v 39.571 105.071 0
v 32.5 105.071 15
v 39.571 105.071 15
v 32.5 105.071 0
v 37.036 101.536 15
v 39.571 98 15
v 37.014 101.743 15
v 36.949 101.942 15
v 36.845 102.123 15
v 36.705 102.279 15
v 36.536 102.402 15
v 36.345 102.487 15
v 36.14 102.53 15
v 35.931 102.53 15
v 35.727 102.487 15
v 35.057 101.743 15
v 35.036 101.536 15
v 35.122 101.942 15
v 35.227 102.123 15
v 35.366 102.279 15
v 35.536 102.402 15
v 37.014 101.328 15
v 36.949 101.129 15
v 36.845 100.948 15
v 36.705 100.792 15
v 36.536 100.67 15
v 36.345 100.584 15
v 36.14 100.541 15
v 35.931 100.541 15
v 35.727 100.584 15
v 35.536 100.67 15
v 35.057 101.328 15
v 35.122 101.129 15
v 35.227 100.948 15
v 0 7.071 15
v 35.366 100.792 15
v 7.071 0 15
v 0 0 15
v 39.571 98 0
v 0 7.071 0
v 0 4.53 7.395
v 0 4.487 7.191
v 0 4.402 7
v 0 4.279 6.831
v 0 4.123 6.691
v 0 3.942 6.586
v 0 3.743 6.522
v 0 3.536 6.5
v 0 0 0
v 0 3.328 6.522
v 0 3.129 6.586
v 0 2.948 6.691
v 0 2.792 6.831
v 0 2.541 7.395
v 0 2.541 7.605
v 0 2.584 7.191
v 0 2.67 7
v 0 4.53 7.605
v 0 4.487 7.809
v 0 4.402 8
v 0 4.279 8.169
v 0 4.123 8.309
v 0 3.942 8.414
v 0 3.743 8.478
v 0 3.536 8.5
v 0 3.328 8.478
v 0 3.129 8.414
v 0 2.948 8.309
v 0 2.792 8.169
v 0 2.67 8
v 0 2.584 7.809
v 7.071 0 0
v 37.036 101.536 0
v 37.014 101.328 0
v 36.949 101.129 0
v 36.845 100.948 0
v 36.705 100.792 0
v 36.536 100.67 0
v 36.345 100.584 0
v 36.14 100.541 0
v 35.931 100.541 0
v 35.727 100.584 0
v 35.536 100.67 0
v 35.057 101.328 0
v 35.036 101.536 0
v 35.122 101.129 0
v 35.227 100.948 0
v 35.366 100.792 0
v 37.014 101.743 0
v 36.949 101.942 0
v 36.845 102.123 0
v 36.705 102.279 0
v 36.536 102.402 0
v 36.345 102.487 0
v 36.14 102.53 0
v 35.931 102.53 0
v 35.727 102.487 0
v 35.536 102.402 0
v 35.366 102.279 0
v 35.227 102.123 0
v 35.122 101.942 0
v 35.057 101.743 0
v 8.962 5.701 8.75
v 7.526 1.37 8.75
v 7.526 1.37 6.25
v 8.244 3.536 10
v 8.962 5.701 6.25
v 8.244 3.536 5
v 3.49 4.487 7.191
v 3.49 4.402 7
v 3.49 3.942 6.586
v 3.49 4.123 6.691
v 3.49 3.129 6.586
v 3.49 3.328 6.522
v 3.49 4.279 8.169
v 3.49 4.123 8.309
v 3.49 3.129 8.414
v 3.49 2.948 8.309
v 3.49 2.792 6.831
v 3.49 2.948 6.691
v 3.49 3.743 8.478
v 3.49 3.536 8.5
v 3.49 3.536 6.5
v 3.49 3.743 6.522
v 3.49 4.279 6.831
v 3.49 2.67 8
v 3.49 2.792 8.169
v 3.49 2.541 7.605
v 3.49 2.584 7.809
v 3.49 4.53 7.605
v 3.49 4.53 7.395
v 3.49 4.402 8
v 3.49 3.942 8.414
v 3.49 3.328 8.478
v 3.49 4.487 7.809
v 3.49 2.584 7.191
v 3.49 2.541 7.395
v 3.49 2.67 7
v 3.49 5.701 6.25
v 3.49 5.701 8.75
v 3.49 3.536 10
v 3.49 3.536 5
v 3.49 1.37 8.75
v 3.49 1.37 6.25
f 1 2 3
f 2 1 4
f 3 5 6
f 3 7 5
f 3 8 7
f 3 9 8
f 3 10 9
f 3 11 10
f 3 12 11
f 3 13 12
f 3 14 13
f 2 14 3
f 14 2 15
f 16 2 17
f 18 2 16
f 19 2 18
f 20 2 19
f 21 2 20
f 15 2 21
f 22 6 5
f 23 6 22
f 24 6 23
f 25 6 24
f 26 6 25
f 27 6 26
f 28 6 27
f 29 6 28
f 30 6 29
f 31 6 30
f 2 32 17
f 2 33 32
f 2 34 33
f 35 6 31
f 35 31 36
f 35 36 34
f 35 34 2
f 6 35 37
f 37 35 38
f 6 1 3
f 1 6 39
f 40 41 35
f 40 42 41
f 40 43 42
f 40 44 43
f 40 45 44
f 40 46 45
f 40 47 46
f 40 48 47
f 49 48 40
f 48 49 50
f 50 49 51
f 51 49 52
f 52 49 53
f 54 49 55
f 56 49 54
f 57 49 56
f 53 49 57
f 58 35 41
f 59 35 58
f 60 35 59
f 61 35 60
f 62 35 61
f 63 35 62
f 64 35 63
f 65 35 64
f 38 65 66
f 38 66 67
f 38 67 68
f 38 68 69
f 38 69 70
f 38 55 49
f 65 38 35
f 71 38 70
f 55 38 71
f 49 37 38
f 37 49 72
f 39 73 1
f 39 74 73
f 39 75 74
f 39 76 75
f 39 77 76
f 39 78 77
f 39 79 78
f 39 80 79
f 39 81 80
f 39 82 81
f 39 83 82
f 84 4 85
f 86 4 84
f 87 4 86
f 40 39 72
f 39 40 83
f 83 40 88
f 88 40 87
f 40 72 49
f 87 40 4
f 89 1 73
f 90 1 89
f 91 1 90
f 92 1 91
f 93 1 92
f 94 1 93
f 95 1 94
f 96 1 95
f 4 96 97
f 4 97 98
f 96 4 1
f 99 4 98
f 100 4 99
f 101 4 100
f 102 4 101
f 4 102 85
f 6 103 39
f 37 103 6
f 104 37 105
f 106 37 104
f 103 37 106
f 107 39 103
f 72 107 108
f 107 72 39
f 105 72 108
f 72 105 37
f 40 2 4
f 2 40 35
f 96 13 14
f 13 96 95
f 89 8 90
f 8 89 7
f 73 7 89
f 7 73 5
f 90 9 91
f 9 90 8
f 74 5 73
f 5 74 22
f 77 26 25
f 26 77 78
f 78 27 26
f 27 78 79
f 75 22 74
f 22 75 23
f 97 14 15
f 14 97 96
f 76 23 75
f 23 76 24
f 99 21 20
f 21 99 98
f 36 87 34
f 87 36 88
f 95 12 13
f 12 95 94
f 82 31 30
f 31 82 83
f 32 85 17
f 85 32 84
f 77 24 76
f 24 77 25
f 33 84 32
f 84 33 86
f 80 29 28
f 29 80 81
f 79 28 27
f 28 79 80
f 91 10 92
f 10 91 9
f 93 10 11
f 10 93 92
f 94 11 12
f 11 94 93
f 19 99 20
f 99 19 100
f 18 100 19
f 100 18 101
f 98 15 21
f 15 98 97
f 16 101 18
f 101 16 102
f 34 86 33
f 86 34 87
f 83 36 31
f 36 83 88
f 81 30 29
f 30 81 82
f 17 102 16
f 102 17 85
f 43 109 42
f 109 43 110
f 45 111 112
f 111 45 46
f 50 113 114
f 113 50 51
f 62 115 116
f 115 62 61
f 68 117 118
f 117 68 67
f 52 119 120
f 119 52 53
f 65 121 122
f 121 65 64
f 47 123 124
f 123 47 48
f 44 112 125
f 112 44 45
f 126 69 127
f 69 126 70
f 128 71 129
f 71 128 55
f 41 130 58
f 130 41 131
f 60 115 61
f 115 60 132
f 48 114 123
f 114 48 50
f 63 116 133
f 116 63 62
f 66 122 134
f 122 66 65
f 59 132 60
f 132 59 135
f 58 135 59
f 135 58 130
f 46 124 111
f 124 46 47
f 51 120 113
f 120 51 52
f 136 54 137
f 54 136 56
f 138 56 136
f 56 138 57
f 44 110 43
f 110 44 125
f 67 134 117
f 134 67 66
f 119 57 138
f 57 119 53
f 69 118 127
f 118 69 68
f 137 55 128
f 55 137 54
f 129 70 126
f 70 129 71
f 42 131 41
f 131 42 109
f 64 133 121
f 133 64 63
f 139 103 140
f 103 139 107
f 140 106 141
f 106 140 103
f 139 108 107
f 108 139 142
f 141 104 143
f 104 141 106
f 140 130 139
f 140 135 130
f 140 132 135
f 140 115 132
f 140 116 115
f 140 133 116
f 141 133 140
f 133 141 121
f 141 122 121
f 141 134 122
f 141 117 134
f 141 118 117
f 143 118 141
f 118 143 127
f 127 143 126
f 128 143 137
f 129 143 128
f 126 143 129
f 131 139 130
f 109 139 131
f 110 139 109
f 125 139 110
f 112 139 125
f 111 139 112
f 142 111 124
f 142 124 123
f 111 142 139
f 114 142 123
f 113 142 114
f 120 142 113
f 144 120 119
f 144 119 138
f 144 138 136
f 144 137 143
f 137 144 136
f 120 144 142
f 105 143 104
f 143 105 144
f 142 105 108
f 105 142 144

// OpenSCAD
/*
Copyright (C) Saeed Gholami Shahbandi. All rights reserved.
Author: Saeed Gholami Shahbandi (saeed.gh.sh@gmail.com)

This file is part of Arrangement Library.
The of Arrangement Library is free software: you can redistribute it and/or
modify it under the terms of the GNU Lesser General Public License as published
by the Free Software Foundation, either version 3 of the License,
or (at your option) any later version.

This program is distributed in the hope that it will be useful, but WITHOUT ANY
WARRANTY; without even the implied warranty of MERCHANTABILITY or FITNESS FOR A
PARTICULAR PURPOSE. See the GNU Lesser General Public License for more details.

You should have received a copy of the GNU Lesser General Public License along
with this program. If not, see <http://www.gnu.org/licenses/>
*/
tol = 0.02;

/*
      __
     /  |
B   /   |
   /   /
  |   /
C |__/
   C   A
*/

/// 863:  long edge of the inside of the wooden frame
/// 120: short edge of the inside of the wooden frame
/// 667: long edge of the plexiglass
/// 55: short edge of the plexiglass
/// height is the space between two plexiglass

height = 15;
A = (120 - 55) / 2;
B = (863 - 667) / 2;

thickness = 10; // desired_thickness of the profile
C = sqrt(thickness * thickness / 2);
screw_diameter=2;
nut_diameter=5;
points = [
     [0, 0], // 1
     [C, 0], // 2
     [A+C, B], // 3
     [A+C, B+C], // 4
     [A, B+C], // 5
     [0, C], // 6
     ];

{
     difference(){
          // extrude the cross-section of the profile
          color("Green", 1.0)
          linear_extrude(height = height)
          polygon(points);

          // remove screw that goes through plexiglass
          color("Red", 1.0)
          translate([A+C/2, B+C/2, height/2 + tol])
          cylinder(h=height+3*tol, d=screw_diameter, $fn= 30, center=true);

          // remove screw that attaches to wooden part (screw body)
          color("Red", 1.0)
          translate([3.5, C/2, height/2])
          rotate([0, 90, 0])
          cylinder(h=7+tol, d=screw_diameter, $fn= 30, center=true);

          // remove screw that attaches to wooden part (nut cap holder)
          color("Blue", 1.0)
          translate([7, C/2, height/2])
          rotate([0, 90, 0])
          cylinder(h=7+tol, d=nut_diameter, $fn=6, center=true);

     }
}
